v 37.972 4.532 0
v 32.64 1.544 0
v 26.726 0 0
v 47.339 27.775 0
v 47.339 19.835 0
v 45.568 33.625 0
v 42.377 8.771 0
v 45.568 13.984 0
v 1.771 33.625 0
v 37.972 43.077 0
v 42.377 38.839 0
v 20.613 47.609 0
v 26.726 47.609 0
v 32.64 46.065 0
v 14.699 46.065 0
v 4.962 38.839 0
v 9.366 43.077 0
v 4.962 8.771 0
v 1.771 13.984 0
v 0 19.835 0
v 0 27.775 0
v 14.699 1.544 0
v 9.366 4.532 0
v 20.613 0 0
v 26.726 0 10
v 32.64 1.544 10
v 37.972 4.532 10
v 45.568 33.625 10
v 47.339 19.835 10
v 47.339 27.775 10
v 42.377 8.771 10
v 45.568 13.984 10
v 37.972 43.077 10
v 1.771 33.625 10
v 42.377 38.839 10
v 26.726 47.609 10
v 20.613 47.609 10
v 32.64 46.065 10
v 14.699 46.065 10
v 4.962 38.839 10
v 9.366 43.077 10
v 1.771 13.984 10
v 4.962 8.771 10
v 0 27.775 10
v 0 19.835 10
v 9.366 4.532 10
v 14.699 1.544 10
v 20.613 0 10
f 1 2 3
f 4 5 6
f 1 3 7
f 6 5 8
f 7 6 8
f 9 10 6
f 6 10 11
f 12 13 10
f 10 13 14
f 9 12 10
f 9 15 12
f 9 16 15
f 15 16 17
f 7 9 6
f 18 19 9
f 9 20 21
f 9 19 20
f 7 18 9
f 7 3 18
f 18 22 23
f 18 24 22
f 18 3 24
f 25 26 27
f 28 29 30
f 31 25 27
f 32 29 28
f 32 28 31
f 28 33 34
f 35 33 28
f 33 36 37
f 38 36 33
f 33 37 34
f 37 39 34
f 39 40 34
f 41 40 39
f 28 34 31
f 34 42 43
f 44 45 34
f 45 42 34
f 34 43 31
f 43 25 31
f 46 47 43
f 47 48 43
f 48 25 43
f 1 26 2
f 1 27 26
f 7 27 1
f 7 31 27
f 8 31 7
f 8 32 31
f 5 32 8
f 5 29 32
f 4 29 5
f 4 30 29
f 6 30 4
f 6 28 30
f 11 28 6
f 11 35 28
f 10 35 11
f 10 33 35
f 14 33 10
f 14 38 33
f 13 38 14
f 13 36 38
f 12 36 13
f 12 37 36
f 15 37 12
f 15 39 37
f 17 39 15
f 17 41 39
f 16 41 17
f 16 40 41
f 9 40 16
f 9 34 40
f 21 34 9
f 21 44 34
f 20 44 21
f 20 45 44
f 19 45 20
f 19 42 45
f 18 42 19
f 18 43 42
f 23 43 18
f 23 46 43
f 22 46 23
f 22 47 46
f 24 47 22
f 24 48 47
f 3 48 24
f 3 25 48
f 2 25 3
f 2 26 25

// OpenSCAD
$fn = 32;

// ----------------------------------------------------------------------
// Flat adaptor: double_d, 10 mm thick
// ----------------------------------------------------------------------

// --- parameters (mm) ---
profile_height = 10;      // extrusion height
profile_points = 24;      // points of the closed outline

profile = [[47.339, 27.775], [45.568, 33.625], [42.377, 38.839], [37.972, 43.077], [32.64, 46.065], [26.726, 47.609], [20.613, 47.609], [14.699, 46.065], [9.366, 43.077], [4.962, 38.839], [1.771, 33.625], [0, 27.775], [0, 19.835], [1.771, 13.984], [4.962, 8.771], [9.366, 4.532], [14.699, 1.544], [20.613, 0], [26.726, 0], [32.64, 1.544], [37.972, 4.532], [42.377, 8.771], [45.568, 13.984], [47.339, 19.835]];  // single closed polygon, 24 points, counter clockwise

// --- the one profile operation ---
linear_extrude(height = profile_height) polygon(points = profile);
